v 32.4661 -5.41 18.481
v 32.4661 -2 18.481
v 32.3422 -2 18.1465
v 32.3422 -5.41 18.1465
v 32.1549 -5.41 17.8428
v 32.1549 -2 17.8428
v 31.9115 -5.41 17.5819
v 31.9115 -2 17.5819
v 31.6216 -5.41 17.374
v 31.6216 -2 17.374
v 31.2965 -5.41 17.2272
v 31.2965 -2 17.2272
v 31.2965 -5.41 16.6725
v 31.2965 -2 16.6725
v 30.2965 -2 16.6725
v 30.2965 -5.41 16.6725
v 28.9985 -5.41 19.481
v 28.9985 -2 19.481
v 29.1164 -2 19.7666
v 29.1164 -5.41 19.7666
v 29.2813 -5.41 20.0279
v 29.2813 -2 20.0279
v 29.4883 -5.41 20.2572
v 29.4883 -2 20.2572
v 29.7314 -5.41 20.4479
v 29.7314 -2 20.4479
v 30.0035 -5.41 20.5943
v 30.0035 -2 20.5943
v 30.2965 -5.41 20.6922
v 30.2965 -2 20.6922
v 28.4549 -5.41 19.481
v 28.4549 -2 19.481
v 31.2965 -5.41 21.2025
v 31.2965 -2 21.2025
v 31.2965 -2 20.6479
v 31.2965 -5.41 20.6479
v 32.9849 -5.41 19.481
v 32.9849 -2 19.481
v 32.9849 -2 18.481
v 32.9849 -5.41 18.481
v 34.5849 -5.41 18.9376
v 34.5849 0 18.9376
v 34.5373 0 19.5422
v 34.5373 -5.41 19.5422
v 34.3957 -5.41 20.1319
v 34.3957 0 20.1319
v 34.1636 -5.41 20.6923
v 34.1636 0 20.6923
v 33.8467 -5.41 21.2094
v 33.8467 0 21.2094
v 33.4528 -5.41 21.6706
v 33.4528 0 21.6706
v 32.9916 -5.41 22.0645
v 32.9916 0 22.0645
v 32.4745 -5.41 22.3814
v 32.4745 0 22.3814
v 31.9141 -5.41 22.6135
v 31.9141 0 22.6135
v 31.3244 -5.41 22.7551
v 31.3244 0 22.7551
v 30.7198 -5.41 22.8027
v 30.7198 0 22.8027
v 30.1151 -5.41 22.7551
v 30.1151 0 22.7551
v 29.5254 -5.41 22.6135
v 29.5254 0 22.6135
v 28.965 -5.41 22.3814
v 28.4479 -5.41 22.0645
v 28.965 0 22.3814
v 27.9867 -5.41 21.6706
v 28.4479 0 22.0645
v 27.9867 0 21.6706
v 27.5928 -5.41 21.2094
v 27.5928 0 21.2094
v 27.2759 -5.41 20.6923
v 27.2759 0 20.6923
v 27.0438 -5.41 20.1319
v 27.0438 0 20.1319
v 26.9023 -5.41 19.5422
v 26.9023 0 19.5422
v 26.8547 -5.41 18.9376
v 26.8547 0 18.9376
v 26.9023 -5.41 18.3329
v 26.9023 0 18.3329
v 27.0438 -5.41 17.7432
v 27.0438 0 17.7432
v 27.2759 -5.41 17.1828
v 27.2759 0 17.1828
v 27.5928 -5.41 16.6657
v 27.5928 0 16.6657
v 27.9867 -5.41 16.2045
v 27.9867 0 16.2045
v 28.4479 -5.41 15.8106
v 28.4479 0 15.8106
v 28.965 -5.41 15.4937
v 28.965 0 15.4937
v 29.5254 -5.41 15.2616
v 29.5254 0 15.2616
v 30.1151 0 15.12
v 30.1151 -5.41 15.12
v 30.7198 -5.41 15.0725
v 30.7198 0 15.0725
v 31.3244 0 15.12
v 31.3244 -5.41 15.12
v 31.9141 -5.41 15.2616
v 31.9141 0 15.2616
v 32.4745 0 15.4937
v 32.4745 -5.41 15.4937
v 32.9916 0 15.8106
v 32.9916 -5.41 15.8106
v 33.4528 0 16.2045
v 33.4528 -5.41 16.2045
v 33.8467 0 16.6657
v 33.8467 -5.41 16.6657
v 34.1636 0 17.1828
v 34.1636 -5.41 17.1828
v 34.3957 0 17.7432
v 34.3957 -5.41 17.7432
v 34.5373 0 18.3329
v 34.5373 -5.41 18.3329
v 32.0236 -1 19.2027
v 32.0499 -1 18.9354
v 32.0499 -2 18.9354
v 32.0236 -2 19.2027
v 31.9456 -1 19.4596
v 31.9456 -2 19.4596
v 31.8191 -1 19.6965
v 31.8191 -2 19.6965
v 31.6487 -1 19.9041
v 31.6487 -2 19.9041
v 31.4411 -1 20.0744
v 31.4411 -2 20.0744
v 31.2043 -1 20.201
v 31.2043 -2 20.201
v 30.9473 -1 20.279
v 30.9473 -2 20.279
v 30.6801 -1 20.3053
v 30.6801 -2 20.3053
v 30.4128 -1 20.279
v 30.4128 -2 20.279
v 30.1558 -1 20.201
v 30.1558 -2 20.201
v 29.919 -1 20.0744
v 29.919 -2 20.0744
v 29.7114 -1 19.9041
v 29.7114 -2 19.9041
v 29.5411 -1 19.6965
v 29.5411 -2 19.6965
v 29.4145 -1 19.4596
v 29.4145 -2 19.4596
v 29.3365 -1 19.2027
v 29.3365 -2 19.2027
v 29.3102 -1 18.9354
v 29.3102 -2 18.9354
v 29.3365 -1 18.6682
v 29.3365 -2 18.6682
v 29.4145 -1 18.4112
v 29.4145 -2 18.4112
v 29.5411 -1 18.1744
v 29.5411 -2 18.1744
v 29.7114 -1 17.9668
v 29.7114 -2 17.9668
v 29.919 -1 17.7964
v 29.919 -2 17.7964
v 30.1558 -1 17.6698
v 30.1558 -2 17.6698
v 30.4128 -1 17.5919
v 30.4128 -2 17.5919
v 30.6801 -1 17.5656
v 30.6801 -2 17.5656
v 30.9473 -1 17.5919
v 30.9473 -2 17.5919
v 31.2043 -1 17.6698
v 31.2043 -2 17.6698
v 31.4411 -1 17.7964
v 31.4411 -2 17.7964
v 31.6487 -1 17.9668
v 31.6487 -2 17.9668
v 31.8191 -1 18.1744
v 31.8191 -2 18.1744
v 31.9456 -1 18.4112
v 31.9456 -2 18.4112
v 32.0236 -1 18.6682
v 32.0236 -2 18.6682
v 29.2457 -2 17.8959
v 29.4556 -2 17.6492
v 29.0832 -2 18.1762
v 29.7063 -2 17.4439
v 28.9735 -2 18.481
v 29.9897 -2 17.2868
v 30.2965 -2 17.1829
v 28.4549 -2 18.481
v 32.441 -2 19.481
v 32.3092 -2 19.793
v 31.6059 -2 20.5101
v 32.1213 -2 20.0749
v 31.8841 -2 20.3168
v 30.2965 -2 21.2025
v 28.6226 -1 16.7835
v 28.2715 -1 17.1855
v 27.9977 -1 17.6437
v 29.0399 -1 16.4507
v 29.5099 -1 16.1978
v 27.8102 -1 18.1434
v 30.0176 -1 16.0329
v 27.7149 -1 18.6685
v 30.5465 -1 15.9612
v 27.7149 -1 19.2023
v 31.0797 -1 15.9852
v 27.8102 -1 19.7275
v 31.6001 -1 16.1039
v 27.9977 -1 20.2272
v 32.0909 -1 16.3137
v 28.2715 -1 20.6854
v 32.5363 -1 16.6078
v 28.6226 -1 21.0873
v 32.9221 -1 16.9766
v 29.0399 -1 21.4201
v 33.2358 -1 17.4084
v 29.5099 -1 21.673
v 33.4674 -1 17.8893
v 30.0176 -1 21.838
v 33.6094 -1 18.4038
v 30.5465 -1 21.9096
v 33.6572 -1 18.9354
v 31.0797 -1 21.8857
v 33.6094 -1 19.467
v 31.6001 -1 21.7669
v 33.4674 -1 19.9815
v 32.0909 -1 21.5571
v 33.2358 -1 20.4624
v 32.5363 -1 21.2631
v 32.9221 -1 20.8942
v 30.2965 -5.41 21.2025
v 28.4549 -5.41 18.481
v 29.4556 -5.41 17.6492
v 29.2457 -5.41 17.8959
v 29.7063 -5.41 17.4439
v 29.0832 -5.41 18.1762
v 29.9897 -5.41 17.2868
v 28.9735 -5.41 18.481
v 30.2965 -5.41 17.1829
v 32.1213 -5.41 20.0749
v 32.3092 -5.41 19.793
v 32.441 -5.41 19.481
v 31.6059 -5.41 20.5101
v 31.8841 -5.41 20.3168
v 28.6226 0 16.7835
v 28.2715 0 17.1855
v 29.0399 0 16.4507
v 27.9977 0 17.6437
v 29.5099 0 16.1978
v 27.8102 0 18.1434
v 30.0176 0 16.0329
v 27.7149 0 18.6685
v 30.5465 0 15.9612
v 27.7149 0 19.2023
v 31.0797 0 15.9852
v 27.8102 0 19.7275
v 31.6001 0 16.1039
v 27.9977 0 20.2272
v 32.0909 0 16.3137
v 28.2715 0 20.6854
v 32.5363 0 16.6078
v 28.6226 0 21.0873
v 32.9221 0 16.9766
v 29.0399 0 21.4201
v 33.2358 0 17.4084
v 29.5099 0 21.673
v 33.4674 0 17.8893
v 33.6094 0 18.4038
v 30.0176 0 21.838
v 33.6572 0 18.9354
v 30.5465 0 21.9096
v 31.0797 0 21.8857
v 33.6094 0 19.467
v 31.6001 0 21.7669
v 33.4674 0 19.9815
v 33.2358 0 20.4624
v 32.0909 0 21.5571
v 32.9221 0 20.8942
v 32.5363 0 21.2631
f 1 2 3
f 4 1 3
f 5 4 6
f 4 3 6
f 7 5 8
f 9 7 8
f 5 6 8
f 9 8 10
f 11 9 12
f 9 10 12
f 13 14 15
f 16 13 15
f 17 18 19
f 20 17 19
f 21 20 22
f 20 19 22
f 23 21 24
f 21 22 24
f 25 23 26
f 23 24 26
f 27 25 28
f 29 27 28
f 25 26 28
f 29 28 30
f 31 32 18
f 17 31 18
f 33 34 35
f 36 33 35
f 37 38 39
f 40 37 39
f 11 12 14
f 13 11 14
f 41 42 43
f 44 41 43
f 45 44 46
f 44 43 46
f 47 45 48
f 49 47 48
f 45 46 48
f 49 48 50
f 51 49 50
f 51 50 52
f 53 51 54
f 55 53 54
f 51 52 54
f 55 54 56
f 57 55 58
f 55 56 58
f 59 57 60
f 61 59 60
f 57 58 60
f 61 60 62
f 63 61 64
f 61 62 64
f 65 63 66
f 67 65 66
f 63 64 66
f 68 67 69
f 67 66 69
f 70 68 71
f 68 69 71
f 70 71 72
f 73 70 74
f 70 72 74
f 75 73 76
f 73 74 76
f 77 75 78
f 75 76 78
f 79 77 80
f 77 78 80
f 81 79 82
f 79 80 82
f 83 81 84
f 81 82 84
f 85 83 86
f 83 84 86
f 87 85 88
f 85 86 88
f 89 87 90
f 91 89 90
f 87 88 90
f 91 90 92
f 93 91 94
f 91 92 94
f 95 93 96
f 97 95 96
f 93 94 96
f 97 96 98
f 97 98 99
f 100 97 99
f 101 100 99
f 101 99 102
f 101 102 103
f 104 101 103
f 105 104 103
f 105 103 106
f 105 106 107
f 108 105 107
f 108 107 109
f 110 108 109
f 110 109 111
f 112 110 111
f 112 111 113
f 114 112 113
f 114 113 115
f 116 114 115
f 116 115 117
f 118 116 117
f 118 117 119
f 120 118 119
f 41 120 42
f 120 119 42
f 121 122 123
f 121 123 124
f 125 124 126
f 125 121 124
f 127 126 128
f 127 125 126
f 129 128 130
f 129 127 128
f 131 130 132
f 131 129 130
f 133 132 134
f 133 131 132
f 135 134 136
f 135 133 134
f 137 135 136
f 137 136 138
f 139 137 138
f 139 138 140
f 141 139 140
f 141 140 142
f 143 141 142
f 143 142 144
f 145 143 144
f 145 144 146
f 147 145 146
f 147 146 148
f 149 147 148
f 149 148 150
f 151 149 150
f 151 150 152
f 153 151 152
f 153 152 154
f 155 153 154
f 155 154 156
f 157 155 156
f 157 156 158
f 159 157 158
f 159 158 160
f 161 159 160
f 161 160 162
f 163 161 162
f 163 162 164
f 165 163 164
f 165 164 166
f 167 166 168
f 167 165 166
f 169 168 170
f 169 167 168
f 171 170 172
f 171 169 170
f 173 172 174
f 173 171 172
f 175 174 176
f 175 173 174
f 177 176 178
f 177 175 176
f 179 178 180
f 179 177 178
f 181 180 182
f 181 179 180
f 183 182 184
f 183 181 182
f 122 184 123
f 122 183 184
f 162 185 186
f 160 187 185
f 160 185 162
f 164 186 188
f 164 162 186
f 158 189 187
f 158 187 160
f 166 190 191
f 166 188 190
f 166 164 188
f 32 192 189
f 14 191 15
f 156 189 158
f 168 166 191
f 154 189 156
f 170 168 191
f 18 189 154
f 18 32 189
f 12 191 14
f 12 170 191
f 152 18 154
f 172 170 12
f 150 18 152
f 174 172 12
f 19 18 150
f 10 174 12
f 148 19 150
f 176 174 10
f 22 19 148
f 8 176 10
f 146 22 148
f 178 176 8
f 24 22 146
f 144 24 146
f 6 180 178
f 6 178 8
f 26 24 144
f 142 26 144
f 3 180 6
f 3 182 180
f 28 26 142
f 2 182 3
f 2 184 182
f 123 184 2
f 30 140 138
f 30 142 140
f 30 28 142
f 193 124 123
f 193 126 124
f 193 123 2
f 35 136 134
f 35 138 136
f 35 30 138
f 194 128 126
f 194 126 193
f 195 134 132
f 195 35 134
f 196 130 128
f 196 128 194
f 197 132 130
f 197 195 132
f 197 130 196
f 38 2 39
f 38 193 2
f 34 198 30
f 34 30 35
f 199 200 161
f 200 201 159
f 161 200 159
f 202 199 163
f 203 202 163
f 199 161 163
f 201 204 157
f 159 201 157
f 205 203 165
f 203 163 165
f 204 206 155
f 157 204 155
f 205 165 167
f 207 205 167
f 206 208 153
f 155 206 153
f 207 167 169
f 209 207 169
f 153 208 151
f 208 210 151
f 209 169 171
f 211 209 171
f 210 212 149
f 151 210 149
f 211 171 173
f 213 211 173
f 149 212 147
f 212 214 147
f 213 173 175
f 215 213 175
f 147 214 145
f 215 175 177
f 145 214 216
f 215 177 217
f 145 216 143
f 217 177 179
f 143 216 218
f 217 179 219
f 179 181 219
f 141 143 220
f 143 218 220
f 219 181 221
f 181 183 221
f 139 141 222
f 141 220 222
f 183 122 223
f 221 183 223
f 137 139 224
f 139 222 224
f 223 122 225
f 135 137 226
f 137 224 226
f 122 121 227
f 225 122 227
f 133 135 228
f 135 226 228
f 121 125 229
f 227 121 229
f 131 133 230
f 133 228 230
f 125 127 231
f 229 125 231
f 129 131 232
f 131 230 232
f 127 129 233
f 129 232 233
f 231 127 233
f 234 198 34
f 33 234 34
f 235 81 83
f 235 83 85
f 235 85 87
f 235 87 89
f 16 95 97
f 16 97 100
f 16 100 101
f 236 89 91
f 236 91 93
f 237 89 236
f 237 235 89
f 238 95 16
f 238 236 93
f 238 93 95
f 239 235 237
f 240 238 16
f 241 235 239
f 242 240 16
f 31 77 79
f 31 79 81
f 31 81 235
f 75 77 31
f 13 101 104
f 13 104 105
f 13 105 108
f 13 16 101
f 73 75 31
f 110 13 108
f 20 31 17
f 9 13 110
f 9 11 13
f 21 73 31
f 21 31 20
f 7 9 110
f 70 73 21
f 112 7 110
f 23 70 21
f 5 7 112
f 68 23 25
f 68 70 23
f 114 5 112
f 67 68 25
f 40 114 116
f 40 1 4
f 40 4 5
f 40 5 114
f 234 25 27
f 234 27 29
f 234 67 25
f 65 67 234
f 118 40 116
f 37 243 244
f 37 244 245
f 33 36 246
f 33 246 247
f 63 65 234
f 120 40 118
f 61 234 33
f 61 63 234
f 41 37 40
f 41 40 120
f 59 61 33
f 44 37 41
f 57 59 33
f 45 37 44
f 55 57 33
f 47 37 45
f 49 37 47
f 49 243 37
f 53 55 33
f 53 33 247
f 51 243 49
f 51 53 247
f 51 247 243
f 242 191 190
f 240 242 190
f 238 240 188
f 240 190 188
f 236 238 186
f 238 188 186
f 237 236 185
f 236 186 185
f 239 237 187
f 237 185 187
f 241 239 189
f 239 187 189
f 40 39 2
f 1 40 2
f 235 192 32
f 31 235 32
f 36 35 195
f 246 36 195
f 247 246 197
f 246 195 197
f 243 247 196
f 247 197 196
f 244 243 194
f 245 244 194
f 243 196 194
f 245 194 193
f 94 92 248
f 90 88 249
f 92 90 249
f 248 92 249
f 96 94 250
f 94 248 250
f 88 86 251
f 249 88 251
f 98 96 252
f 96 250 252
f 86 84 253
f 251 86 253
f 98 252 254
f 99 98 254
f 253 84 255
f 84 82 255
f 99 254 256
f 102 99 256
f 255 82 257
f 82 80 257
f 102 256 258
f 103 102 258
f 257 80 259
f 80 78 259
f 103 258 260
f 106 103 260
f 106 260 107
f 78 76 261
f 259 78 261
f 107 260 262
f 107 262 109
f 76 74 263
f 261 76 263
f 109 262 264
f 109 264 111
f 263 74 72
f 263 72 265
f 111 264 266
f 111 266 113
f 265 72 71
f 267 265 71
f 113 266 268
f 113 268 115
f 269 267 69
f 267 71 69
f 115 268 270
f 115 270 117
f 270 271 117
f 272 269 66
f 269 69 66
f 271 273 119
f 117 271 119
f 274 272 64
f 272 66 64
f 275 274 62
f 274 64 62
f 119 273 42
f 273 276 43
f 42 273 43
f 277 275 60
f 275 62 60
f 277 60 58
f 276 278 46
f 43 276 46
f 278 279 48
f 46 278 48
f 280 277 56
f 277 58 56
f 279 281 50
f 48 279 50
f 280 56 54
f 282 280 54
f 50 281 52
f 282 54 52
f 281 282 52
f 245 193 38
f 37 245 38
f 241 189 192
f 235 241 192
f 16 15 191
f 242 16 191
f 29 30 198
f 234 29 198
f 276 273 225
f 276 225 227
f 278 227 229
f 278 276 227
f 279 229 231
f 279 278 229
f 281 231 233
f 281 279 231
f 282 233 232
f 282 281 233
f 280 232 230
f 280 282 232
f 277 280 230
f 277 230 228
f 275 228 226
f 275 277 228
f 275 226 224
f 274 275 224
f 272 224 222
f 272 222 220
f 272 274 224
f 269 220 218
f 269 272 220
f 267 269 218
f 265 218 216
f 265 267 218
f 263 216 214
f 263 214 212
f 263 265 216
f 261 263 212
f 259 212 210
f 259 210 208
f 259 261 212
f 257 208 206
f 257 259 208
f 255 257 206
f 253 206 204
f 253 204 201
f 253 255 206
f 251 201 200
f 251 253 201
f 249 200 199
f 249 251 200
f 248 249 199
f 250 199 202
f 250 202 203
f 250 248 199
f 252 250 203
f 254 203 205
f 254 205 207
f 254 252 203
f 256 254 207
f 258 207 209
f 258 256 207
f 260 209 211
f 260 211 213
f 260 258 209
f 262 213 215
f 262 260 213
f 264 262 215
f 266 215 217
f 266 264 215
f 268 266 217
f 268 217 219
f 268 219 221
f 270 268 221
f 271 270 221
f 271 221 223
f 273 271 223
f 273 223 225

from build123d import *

# Parameters (mm, degrees)
F0_R     = 3.8651
F1_DEPTH = 5.41
F2_R     = 2.977189
F2_R_2   = 1.369861
F3_DEPTH = 2
F4_DEPTH = 1


with BuildPart() as f1:
    # F0 (on Front) → F1 (new body)
    with BuildSketch(Plane.XZ):
        with Locations((30.719768, 18.937557)):
            Circle(F0_R)
        with BuildLine():
            ThreePointArc((28.998524, 19.481013), (29.488314, 20.257233), (30.296515, 20.692231))
            Line((30.296515, 20.692231), (30.296515, 21.202457))
            Line((30.296515, 21.202457), (31.296515, 21.202457))
            Line((31.296515, 21.202457), (31.296515, 20.647933))
            ThreePointArc((31.296515, 20.647933), (32.008417, 20.201443), (32.441011, 19.481013))
            Line((32.441011, 19.481013), (32.984868, 19.481013))
            Line((32.984868, 19.481013), (32.984868, 18.481013))
            Line((32.984868, 18.481013), (32.466076, 18.481013))
            ThreePointArc((32.466076, 18.481013), (32.039681, 17.706356), (31.296515, 17.22718))
            Line((31.296515, 17.22718), (31.296515, 16.672457))
            Line((31.296515, 16.672457), (30.296515, 16.672457))
            Line((30.296515, 16.672457), (30.296515, 17.182882))
            ThreePointArc((30.296515, 17.182882), (29.455634, 17.64915), (28.973459, 18.481013))
            Line((28.973459, 18.481013), (28.454868, 18.481013))
            Line((28.454868, 18.481013), (28.454868, 19.481013))
            Line((28.454868, 19.481013), (28.998524, 19.481013))
        make_face(mode=Mode.SUBTRACT)
    extrude(amount=F1_DEPTH)

    # F2 (on Front) → F3 (join)
    with BuildSketch(Plane.XZ):
        with Locations((30.680057, 18.935421)):
            Circle(F2_R)
        with Locations((30.680057, 18.935421)):
            Circle(F2_R_2, mode=Mode.SUBTRACT)
    extrude(amount=F3_DEPTH)

    # F2 (on Front) → F4 (cut)
    with BuildSketch(Plane.XZ):
        with Locations((30.680057, 18.935421)):
            Circle(F2_R)
        with Locations((30.680057, 18.935421)):
            Circle(F2_R_2, mode=Mode.SUBTRACT)
    extrude(amount=F4_DEPTH, mode=Mode.SUBTRACT)


solid = f1.part
